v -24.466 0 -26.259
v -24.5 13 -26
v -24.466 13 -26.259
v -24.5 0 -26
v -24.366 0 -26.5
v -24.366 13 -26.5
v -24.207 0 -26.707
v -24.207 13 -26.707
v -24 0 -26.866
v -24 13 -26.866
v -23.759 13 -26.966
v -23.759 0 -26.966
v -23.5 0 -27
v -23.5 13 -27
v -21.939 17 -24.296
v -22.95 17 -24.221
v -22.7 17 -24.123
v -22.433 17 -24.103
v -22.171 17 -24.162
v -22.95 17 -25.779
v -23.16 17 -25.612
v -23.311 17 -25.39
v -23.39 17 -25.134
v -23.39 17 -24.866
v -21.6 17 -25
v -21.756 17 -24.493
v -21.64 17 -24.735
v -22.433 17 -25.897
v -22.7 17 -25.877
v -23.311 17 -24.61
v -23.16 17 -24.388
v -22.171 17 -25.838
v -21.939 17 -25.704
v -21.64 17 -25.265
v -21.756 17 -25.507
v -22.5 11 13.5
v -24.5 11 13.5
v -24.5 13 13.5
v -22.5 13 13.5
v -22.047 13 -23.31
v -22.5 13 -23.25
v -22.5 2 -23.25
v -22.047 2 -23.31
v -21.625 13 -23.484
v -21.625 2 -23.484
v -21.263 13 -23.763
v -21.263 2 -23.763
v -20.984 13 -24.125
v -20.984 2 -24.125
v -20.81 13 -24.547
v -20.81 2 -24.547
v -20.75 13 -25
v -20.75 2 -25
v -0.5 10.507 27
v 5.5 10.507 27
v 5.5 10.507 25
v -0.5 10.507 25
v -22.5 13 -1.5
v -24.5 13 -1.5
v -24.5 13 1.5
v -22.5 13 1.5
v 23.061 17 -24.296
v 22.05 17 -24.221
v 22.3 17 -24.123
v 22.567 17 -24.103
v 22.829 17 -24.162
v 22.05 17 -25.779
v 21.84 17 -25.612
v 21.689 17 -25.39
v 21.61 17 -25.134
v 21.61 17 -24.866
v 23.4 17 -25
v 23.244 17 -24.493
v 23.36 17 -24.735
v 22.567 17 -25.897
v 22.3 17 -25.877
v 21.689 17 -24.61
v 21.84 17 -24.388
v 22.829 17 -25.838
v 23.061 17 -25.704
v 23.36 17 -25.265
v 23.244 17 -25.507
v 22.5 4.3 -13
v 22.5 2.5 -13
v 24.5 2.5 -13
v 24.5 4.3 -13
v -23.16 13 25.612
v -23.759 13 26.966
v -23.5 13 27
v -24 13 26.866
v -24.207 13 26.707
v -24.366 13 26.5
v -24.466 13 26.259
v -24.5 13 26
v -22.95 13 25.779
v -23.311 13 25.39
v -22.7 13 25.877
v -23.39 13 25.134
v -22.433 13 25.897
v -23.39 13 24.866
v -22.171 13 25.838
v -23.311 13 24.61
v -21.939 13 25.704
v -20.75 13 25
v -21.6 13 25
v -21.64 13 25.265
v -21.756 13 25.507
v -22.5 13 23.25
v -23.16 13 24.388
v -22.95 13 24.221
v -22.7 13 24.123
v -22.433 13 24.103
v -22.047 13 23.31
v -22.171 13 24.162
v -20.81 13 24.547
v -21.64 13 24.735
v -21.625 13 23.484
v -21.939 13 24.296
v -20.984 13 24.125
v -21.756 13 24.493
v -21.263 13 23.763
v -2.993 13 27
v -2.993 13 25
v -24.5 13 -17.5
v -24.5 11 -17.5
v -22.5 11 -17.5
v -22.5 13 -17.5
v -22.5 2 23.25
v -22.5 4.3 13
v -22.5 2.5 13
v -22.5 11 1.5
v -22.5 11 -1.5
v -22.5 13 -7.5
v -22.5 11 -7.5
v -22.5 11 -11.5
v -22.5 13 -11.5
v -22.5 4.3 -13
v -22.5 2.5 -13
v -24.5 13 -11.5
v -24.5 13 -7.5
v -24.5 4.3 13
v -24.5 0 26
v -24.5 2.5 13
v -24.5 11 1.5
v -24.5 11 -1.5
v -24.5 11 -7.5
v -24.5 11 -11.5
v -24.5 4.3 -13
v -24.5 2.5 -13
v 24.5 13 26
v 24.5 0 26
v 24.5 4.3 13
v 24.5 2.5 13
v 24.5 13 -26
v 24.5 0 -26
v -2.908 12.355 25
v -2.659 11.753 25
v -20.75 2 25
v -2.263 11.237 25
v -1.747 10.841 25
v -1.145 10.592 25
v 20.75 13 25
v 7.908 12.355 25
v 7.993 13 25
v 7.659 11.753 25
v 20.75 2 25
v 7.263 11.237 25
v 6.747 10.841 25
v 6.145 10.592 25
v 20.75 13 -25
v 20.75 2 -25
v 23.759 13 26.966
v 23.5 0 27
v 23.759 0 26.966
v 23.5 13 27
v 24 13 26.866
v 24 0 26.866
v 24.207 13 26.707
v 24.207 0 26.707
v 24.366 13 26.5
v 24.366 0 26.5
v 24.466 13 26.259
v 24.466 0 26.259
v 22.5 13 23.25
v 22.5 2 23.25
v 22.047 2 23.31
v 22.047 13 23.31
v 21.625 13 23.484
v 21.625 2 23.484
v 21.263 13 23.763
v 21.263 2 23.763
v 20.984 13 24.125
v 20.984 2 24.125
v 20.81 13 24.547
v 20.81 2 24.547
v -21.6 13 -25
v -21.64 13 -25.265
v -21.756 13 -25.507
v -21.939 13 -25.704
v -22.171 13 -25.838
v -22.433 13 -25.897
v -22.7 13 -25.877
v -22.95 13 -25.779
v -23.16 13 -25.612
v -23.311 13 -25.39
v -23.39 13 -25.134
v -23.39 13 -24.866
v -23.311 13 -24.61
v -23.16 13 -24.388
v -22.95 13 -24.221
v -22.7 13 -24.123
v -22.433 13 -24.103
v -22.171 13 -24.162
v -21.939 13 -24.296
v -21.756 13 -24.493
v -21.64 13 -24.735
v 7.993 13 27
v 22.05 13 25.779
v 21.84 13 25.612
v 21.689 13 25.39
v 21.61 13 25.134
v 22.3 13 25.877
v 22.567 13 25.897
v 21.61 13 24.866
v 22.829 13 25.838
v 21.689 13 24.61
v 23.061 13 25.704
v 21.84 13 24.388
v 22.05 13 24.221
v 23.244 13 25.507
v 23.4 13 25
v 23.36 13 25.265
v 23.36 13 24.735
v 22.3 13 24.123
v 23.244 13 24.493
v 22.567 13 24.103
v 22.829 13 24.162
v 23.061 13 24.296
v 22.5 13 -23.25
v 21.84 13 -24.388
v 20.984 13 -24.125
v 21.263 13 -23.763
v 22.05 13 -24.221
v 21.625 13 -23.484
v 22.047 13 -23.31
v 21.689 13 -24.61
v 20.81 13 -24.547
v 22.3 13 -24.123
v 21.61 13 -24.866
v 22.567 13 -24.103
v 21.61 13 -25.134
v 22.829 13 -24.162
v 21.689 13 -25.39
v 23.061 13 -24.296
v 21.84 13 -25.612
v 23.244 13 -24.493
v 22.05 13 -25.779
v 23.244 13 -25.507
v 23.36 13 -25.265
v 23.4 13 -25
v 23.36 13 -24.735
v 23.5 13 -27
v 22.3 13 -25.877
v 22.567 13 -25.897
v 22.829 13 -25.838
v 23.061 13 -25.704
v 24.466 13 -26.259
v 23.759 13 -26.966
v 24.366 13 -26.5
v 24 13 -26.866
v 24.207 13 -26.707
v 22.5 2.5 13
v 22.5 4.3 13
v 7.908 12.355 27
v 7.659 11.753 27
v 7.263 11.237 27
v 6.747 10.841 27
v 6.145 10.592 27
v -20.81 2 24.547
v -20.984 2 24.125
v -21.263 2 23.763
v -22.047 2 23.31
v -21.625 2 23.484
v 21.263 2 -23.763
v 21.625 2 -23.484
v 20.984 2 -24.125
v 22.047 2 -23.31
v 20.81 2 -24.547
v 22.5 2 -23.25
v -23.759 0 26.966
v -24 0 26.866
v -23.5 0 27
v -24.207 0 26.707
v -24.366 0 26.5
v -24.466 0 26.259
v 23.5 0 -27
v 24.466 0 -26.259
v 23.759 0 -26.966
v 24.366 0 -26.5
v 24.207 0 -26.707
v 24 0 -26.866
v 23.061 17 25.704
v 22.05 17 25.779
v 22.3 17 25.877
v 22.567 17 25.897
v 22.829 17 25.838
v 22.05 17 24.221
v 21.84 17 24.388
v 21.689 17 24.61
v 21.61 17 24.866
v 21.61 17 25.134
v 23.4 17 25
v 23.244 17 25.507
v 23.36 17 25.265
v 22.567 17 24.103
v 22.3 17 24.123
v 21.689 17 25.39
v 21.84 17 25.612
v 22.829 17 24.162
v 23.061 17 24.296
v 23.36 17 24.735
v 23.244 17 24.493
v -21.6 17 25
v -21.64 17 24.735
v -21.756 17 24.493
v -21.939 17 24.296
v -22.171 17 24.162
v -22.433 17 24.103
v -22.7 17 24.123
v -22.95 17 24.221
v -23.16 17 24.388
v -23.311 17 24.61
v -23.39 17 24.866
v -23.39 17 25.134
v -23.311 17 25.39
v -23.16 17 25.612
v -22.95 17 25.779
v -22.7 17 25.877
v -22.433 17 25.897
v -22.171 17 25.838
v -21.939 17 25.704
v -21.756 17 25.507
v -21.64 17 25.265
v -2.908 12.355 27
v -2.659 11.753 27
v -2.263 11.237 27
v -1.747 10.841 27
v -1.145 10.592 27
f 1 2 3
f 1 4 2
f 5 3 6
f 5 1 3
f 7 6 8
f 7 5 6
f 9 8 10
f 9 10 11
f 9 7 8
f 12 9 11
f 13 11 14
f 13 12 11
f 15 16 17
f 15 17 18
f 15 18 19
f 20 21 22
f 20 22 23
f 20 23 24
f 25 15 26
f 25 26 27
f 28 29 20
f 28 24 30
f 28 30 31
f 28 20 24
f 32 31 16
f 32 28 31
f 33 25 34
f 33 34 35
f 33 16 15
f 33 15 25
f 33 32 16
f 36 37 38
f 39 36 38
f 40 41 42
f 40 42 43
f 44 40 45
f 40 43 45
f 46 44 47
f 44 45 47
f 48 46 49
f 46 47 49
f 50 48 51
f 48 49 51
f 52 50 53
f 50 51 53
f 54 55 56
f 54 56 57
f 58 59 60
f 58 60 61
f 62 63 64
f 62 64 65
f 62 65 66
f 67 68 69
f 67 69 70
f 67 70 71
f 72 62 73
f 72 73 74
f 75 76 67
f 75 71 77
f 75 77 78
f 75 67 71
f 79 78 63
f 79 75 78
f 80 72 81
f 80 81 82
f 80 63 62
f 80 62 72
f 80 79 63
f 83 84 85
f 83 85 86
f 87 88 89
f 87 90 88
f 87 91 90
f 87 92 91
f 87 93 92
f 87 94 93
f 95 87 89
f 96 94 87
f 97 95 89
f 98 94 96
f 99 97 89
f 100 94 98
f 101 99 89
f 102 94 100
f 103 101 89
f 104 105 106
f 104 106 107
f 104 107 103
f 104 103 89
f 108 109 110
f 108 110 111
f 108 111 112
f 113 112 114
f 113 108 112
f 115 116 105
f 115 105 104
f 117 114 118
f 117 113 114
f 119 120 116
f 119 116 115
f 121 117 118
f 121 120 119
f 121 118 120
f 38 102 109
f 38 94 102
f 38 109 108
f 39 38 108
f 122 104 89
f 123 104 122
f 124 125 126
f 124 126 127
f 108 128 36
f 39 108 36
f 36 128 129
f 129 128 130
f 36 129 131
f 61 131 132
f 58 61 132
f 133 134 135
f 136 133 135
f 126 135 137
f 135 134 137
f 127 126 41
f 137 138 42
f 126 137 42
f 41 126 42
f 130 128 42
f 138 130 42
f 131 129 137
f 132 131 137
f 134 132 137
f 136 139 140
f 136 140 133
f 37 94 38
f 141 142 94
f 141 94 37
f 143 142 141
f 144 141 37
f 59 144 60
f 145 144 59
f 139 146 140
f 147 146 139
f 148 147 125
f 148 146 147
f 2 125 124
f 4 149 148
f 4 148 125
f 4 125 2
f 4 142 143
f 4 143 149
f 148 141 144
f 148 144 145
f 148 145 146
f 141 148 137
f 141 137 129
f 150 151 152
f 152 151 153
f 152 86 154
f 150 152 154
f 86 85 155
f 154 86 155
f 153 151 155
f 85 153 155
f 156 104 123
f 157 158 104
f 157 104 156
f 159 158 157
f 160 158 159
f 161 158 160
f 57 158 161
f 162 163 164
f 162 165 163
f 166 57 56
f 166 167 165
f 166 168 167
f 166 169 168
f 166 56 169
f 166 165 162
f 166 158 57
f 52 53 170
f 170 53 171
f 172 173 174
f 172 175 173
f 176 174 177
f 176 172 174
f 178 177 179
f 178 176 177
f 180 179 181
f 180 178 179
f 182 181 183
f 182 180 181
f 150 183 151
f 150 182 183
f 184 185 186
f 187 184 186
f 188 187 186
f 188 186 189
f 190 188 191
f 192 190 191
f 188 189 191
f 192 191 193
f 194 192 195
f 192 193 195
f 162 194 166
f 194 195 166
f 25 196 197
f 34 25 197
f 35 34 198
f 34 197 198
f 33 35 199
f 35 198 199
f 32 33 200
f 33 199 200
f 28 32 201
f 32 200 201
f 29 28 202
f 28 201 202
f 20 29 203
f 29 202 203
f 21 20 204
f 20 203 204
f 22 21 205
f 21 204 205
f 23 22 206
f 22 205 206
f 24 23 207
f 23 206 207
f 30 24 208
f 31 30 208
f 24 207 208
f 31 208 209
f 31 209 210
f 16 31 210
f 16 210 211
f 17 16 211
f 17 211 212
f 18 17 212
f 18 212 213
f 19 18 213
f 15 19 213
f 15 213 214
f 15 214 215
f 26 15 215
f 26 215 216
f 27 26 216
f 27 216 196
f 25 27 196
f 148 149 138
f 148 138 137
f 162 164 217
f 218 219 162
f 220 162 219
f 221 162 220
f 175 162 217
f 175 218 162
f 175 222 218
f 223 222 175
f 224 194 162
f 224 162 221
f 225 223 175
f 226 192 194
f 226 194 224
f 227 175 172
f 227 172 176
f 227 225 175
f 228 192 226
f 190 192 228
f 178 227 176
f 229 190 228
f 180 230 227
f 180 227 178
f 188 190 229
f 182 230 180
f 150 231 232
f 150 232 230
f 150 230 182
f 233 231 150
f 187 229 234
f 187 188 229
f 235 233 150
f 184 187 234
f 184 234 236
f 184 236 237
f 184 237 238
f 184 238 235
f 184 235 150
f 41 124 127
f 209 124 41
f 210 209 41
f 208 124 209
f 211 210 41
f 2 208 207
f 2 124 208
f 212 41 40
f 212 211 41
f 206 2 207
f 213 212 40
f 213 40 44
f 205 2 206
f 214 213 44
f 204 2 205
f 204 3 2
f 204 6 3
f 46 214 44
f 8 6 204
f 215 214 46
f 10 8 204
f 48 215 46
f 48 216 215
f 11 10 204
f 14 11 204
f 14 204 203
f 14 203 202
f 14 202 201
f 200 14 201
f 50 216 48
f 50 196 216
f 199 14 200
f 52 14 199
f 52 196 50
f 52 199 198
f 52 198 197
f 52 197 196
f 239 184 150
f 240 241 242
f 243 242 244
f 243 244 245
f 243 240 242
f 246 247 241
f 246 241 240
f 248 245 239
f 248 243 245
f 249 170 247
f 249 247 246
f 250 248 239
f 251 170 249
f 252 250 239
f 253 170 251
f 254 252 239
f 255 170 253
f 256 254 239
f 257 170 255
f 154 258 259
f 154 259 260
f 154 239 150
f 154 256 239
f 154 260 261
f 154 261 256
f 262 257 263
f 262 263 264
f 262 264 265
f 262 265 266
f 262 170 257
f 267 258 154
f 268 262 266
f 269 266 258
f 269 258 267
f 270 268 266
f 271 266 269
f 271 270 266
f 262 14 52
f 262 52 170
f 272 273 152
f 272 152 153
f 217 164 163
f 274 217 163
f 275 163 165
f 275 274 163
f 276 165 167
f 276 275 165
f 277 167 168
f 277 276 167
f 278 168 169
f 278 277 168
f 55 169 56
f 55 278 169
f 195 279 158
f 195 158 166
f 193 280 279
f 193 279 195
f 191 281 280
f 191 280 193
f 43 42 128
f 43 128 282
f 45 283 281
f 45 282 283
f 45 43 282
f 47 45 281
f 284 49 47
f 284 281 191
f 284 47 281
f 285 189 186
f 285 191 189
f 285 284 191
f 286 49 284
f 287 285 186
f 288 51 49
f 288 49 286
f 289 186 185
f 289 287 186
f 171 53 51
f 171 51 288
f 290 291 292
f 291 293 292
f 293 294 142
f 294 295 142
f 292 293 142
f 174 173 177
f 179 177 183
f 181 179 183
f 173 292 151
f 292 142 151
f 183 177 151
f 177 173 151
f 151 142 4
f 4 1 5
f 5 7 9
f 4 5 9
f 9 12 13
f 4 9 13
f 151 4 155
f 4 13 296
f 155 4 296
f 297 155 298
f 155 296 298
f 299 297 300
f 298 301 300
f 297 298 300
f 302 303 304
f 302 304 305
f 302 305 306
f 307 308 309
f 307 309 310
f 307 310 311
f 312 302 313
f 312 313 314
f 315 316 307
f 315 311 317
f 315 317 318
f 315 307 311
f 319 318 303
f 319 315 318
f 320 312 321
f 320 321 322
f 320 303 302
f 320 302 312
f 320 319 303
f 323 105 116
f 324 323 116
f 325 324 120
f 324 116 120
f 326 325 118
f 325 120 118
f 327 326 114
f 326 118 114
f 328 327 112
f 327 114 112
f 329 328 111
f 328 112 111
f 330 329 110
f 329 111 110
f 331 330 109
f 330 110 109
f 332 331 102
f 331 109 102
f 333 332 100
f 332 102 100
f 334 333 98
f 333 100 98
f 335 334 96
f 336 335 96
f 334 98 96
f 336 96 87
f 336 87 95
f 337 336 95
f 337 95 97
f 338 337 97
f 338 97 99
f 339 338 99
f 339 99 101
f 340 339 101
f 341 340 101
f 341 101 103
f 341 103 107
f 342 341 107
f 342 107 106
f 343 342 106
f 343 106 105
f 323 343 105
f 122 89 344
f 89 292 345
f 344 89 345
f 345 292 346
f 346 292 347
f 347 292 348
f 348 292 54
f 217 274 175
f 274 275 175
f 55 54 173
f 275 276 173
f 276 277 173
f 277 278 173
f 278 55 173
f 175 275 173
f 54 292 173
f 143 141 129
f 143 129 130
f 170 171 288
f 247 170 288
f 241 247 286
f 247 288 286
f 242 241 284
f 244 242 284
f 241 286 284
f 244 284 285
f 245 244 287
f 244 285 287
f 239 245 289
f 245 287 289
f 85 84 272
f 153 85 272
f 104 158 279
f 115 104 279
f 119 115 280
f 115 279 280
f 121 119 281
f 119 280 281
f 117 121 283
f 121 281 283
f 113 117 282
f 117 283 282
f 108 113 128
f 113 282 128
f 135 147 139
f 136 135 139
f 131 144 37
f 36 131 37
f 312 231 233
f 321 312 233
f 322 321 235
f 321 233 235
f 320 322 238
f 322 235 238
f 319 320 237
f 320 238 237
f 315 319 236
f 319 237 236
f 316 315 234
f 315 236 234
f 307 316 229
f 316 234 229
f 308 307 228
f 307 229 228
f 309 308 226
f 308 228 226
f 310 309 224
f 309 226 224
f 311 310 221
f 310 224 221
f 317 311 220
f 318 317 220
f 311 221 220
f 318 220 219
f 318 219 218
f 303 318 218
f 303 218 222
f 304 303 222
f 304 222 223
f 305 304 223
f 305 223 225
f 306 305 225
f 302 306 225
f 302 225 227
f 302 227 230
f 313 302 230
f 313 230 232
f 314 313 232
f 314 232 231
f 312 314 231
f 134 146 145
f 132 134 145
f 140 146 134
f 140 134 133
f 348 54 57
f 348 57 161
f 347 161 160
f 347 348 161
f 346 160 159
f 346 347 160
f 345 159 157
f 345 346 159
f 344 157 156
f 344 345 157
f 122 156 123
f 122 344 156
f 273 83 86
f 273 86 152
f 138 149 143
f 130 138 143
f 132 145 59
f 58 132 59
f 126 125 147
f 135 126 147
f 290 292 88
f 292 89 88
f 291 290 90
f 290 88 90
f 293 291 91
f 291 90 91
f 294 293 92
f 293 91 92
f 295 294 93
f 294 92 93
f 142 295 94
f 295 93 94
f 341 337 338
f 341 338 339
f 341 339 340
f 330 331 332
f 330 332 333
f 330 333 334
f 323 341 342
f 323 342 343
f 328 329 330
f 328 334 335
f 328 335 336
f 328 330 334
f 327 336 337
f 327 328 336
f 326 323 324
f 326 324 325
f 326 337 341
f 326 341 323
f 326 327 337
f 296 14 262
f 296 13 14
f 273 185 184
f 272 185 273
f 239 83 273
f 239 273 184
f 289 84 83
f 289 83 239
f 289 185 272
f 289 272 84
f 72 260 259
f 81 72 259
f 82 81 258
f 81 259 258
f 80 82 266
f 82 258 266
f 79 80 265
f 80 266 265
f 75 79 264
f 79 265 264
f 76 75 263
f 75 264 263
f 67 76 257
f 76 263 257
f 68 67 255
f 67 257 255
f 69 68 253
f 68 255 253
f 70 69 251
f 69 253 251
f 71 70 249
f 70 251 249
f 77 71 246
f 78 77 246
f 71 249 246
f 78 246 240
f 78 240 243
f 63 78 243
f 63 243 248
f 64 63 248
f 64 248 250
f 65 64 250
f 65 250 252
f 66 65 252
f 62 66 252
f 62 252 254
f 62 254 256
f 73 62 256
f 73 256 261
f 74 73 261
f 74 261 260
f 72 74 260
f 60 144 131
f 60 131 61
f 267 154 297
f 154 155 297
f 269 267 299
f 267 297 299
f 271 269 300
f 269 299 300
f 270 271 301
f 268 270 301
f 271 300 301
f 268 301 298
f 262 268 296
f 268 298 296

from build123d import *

# Parameters (mm, degrees)
SKETCH1_W             = 49
SKETCH1_H             = 54
BOSS_EXTRUDE1_DEPTH   = 2
SKETCH2_W             = 49
SKETCH2_H             = 54
SKETCH2_W_2           = 45
SKETCH2_H_2           = 50
EXTRUDE_THIN1_DEPTH   = 11
SKETCH7_W             = 6
SKETCH7_H             = 2
CUT_EXTRUDE1_DEPTH    = 2
SKETCH6_W             = 12
SKETCH6_H             = 2
CUT_EXTRUDE2_DEPTH    = 2
CUT_EXTRUDE3_DEPTH    = 2
SKETCH15_R            = 1.75
BOSS_EXTRUDE2_DEPTH   = 11
BOSS_EXTRUDE2_2_DEPTH = 11
BOSS_EXTRUDE2_3_DEPTH = 11
BOSS_EXTRUDE2_4_DEPTH = 11
SKETCH17_R            = 0.9
BOSS_EXTRUDE3_DEPTH   = 15
CUT_EXTRUDE4_DEPTH    = 49
FILLET1_R             = 1


with BuildPart() as part:
    # Sketch1 → Boss-Extrude1 (new body)
    with BuildSketch(Plane(origin=(0, 0, 0), x_dir=(1, 0, 0), z_dir=(0, 1, 0))):
        Rectangle(SKETCH1_W, SKETCH1_H)
    extrude(amount=BOSS_EXTRUDE1_DEPTH)

    # Sketch2 → Extrude-Thin1 (add)
    with BuildSketch(Plane(origin=(0, 2, 0), x_dir=(1, 0, 0), z_dir=(0, 1, 0))):
        Rectangle(SKETCH2_W, SKETCH2_H)
        Rectangle(SKETCH2_W_2, SKETCH2_H_2, mode=Mode.SUBTRACT)
    extrude(amount=EXTRUDE_THIN1_DEPTH)

    # Sketch7 → Cut-Extrude1 (cut)
    with BuildSketch(Plane.ZY.offset(24.5)):
        with Locations((-4.5, 12)):
            Rectangle(SKETCH7_W, SKETCH7_H)
        with Locations((-14.5, 12)):
            Rectangle(SKETCH7_W, SKETCH7_H)
    extrude(amount=-CUT_EXTRUDE1_DEPTH, mode=Mode.SUBTRACT)

    # Sketch6 → Cut-Extrude2 (cut)
    with BuildSketch(Plane.ZY.offset(24.5)):
        with Locations((7.5, 12)):
            Rectangle(SKETCH6_W, SKETCH6_H)
    extrude(amount=-CUT_EXTRUDE2_DEPTH, mode=Mode.SUBTRACT)

    # Sketch14 → Cut-Extrude3 (cut)
    with BuildSketch(Plane.XY.offset(27)):
        with BuildLine():
            Line((-0.5, 15.493238672), (5.5, 15.493238672))
            ThreePointArc((5.5, 15.493238672), (7.993238672, 13), (5.5, 10.506761328))
            Line((5.5, 10.506761328), (-0.5, 10.506761328))
            ThreePointArc((-0.5, 10.506761328), (-2.993238672, 13), (-0.5, 15.493238672))
        make_face()
    extrude(amount=-CUT_EXTRUDE3_DEPTH, mode=Mode.SUBTRACT)



with BuildPart() as body_2:
    # Sketch15 → Boss-Extrude2 (new body)
    with BuildSketch(Plane(origin=(0, 2, 0), x_dir=(1, 0, 0), z_dir=(0, 1, 0))):
        with Locations((-22.5, -25)):
            Circle(SKETCH15_R)
    extrude(amount=BOSS_EXTRUDE2_DEPTH)


with BuildPart() as body_3:
    # Sketch15 → Boss-Extrude2 2 (new body)
    with BuildSketch(Plane(origin=(0, 2, 0), x_dir=(1, 0, 0), z_dir=(0, 1, 0))):
        with Locations((-22.5, 25)):
            Circle(SKETCH15_R)
    extrude(amount=BOSS_EXTRUDE2_2_DEPTH)


with BuildPart() as body_4:
    # Sketch15 → Boss-Extrude2 3 (new body)
    with BuildSketch(Plane(origin=(0, 2, 0), x_dir=(1, 0, 0), z_dir=(0, 1, 0))):
        with Locations((22.5, 25)):
            Circle(SKETCH15_R)
    extrude(amount=BOSS_EXTRUDE2_3_DEPTH)


with BuildPart() as body_5:
    # Sketch15 → Boss-Extrude2 4 (new body)
    with BuildSketch(Plane(origin=(0, 2, 0), x_dir=(1, 0, 0), z_dir=(0, 1, 0))):
        with Locations((22.5, -25)):
            Circle(SKETCH15_R)
    extrude(amount=BOSS_EXTRUDE2_4_DEPTH)


with BuildPart() as part_1:
    add(part.part)

    add(body_2.part)  # Boss-Extrude3 merges body 2

    add(body_3.part)  # Boss-Extrude3 merges body 3

    add(body_4.part)  # Boss-Extrude3 merges body 4

    add(body_5.part)  # Boss-Extrude3 merges body 5
    # Sketch17 → Boss-Extrude3 (add)
    with BuildSketch(Plane(origin=(0, 2, 0), x_dir=(1, 0, 0), z_dir=(0, 1, 0))):
        with Locations((-22.5, -25)):
            Circle(SKETCH17_R)
        with Locations((22.5, -25)):
            Circle(SKETCH17_R)
        with Locations((22.5, 25)):
            Circle(SKETCH17_R)
        with Locations((-22.5, 25)):
            Circle(SKETCH17_R)
    extrude(amount=BOSS_EXTRUDE3_DEPTH)

    # Sketch21 → Cut-Extrude4 (cut)
    with BuildSketch(Plane.ZY.offset(24.5)):
        Polygon((0, 2.5), (-13, 2.5), (-13, 4.3), (13, 4.3), (13, 2.5), align=None)
    extrude(amount=-CUT_EXTRUDE4_DEPTH, mode=Mode.SUBTRACT)

    # Fillet1
    fillet1_edges = [part_1.edges().sort_by_distance(p)[0] for p in [
        (-24.5, 6.5, -27),
        (24.5, 6.5, -27),
        (24.5, 6.5, 27),
        (-24.5, 6.5, 27),
    ]]
    fillet(fillet1_edges, radius=FILLET1_R)


solid = part_1.part
